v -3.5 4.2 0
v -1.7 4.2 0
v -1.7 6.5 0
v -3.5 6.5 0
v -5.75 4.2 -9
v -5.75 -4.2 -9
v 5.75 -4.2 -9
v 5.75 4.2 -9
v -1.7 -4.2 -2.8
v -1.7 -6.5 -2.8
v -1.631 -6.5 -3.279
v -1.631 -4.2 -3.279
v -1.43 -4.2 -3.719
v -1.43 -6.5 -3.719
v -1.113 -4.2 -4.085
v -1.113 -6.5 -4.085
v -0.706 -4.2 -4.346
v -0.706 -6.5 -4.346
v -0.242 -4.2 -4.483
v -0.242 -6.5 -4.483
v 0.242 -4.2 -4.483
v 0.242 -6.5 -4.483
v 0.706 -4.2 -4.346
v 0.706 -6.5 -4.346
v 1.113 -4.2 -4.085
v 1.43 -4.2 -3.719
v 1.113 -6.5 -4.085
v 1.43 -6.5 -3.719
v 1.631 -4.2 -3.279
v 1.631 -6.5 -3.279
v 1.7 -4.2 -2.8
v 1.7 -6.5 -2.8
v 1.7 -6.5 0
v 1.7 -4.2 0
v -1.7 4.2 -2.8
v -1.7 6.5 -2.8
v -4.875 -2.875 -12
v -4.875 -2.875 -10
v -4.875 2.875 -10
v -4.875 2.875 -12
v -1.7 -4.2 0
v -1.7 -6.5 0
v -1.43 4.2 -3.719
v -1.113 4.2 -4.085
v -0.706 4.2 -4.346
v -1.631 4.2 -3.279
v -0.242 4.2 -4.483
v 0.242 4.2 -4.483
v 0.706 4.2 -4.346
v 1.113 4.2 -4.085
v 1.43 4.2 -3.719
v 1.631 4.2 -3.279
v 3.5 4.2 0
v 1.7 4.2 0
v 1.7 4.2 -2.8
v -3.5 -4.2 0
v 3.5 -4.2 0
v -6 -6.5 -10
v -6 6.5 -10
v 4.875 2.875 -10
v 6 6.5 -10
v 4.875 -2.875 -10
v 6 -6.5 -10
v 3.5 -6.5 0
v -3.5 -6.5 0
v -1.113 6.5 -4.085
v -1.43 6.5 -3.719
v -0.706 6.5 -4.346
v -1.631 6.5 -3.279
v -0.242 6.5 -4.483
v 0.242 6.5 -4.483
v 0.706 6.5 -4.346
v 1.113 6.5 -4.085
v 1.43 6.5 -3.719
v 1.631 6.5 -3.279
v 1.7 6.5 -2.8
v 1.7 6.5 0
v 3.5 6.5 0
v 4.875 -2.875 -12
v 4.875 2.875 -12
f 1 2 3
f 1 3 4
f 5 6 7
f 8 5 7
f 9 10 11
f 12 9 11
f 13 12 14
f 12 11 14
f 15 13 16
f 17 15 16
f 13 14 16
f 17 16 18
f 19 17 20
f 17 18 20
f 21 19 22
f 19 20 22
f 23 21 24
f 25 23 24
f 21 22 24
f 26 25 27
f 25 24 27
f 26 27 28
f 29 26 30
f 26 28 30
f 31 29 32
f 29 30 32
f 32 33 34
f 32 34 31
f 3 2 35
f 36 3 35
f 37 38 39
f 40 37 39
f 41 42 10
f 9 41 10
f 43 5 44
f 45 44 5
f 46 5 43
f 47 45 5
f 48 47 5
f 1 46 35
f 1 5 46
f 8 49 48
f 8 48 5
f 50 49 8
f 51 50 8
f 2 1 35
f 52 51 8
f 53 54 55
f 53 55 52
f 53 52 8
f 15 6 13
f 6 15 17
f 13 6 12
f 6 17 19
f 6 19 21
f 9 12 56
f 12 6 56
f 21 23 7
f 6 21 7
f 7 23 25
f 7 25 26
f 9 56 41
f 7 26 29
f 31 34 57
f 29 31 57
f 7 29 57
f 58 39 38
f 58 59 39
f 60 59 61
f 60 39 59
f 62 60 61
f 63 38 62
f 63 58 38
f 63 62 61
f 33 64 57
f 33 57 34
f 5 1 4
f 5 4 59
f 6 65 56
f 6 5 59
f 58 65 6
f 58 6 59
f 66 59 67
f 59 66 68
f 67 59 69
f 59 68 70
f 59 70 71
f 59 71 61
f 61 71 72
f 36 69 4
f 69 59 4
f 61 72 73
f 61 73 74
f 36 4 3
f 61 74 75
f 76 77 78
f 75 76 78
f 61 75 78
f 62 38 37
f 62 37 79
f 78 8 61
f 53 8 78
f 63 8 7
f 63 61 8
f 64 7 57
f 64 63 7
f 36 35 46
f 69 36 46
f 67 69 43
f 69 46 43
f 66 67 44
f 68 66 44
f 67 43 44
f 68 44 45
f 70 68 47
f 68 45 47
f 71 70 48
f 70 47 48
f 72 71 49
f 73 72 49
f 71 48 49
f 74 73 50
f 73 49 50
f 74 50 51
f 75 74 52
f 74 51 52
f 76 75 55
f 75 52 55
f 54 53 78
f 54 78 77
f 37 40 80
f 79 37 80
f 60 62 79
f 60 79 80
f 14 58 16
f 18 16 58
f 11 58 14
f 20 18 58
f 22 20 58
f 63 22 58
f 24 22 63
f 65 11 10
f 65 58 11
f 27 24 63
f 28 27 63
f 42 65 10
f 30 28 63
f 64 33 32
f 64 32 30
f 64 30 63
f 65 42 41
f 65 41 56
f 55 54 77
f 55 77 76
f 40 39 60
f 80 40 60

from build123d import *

# Parameters (mm, degrees)
PAD106_DEPTH    = 6.5
SKETCH195_W     = 12
SKETCH195_H     = 9
POCKET046_DEPTH = 4.2
SKETCH196_W     = 9.75
SKETCH196_H     = 5.75
PAD107_DEPTH    = 2


with BuildPart() as part:
    # Sketch194 → Pad106 (new body, symmetric)
    with BuildSketch(Plane.XZ):
        with BuildLine():
            Line((-1.7, 10), (-3.5, 10))
            Line((-3.5, 10), (-6, 0))
            Line((-6, 0), (6, 0))
            Line((6, 0), (3.5, 10))
            Line((3.5, 10), (1.7, 10))
            Line((1.7, 10), (1.7, 7.2))
            ThreePointArc((-1.7, 7.2), (0, 5.5), (1.7, 7.2))
            Line((-1.7, 10), (-1.7, 7.2))
        make_face()
    extrude(amount=PAD106_DEPTH, both=True)

    # Sketch195 → Pocket046 (cut, symmetric)
    with BuildSketch(Plane.XZ):
        with Locations((0, 5.5)):
            Rectangle(SKETCH195_W, SKETCH195_H)
    extrude(amount=POCKET046_DEPTH, both=True, mode=Mode.SUBTRACT)

    # Sketch196 → Pad107 (join)
    with BuildSketch(Plane.XY):
        Rectangle(SKETCH196_W, SKETCH196_H)
    extrude(amount=-PAD107_DEPTH)


with BuildPart() as part_1:
    # Body150 placement: moved
    add(part.part.moved(Location((0, 0, -10))))


solid = part_1.part
